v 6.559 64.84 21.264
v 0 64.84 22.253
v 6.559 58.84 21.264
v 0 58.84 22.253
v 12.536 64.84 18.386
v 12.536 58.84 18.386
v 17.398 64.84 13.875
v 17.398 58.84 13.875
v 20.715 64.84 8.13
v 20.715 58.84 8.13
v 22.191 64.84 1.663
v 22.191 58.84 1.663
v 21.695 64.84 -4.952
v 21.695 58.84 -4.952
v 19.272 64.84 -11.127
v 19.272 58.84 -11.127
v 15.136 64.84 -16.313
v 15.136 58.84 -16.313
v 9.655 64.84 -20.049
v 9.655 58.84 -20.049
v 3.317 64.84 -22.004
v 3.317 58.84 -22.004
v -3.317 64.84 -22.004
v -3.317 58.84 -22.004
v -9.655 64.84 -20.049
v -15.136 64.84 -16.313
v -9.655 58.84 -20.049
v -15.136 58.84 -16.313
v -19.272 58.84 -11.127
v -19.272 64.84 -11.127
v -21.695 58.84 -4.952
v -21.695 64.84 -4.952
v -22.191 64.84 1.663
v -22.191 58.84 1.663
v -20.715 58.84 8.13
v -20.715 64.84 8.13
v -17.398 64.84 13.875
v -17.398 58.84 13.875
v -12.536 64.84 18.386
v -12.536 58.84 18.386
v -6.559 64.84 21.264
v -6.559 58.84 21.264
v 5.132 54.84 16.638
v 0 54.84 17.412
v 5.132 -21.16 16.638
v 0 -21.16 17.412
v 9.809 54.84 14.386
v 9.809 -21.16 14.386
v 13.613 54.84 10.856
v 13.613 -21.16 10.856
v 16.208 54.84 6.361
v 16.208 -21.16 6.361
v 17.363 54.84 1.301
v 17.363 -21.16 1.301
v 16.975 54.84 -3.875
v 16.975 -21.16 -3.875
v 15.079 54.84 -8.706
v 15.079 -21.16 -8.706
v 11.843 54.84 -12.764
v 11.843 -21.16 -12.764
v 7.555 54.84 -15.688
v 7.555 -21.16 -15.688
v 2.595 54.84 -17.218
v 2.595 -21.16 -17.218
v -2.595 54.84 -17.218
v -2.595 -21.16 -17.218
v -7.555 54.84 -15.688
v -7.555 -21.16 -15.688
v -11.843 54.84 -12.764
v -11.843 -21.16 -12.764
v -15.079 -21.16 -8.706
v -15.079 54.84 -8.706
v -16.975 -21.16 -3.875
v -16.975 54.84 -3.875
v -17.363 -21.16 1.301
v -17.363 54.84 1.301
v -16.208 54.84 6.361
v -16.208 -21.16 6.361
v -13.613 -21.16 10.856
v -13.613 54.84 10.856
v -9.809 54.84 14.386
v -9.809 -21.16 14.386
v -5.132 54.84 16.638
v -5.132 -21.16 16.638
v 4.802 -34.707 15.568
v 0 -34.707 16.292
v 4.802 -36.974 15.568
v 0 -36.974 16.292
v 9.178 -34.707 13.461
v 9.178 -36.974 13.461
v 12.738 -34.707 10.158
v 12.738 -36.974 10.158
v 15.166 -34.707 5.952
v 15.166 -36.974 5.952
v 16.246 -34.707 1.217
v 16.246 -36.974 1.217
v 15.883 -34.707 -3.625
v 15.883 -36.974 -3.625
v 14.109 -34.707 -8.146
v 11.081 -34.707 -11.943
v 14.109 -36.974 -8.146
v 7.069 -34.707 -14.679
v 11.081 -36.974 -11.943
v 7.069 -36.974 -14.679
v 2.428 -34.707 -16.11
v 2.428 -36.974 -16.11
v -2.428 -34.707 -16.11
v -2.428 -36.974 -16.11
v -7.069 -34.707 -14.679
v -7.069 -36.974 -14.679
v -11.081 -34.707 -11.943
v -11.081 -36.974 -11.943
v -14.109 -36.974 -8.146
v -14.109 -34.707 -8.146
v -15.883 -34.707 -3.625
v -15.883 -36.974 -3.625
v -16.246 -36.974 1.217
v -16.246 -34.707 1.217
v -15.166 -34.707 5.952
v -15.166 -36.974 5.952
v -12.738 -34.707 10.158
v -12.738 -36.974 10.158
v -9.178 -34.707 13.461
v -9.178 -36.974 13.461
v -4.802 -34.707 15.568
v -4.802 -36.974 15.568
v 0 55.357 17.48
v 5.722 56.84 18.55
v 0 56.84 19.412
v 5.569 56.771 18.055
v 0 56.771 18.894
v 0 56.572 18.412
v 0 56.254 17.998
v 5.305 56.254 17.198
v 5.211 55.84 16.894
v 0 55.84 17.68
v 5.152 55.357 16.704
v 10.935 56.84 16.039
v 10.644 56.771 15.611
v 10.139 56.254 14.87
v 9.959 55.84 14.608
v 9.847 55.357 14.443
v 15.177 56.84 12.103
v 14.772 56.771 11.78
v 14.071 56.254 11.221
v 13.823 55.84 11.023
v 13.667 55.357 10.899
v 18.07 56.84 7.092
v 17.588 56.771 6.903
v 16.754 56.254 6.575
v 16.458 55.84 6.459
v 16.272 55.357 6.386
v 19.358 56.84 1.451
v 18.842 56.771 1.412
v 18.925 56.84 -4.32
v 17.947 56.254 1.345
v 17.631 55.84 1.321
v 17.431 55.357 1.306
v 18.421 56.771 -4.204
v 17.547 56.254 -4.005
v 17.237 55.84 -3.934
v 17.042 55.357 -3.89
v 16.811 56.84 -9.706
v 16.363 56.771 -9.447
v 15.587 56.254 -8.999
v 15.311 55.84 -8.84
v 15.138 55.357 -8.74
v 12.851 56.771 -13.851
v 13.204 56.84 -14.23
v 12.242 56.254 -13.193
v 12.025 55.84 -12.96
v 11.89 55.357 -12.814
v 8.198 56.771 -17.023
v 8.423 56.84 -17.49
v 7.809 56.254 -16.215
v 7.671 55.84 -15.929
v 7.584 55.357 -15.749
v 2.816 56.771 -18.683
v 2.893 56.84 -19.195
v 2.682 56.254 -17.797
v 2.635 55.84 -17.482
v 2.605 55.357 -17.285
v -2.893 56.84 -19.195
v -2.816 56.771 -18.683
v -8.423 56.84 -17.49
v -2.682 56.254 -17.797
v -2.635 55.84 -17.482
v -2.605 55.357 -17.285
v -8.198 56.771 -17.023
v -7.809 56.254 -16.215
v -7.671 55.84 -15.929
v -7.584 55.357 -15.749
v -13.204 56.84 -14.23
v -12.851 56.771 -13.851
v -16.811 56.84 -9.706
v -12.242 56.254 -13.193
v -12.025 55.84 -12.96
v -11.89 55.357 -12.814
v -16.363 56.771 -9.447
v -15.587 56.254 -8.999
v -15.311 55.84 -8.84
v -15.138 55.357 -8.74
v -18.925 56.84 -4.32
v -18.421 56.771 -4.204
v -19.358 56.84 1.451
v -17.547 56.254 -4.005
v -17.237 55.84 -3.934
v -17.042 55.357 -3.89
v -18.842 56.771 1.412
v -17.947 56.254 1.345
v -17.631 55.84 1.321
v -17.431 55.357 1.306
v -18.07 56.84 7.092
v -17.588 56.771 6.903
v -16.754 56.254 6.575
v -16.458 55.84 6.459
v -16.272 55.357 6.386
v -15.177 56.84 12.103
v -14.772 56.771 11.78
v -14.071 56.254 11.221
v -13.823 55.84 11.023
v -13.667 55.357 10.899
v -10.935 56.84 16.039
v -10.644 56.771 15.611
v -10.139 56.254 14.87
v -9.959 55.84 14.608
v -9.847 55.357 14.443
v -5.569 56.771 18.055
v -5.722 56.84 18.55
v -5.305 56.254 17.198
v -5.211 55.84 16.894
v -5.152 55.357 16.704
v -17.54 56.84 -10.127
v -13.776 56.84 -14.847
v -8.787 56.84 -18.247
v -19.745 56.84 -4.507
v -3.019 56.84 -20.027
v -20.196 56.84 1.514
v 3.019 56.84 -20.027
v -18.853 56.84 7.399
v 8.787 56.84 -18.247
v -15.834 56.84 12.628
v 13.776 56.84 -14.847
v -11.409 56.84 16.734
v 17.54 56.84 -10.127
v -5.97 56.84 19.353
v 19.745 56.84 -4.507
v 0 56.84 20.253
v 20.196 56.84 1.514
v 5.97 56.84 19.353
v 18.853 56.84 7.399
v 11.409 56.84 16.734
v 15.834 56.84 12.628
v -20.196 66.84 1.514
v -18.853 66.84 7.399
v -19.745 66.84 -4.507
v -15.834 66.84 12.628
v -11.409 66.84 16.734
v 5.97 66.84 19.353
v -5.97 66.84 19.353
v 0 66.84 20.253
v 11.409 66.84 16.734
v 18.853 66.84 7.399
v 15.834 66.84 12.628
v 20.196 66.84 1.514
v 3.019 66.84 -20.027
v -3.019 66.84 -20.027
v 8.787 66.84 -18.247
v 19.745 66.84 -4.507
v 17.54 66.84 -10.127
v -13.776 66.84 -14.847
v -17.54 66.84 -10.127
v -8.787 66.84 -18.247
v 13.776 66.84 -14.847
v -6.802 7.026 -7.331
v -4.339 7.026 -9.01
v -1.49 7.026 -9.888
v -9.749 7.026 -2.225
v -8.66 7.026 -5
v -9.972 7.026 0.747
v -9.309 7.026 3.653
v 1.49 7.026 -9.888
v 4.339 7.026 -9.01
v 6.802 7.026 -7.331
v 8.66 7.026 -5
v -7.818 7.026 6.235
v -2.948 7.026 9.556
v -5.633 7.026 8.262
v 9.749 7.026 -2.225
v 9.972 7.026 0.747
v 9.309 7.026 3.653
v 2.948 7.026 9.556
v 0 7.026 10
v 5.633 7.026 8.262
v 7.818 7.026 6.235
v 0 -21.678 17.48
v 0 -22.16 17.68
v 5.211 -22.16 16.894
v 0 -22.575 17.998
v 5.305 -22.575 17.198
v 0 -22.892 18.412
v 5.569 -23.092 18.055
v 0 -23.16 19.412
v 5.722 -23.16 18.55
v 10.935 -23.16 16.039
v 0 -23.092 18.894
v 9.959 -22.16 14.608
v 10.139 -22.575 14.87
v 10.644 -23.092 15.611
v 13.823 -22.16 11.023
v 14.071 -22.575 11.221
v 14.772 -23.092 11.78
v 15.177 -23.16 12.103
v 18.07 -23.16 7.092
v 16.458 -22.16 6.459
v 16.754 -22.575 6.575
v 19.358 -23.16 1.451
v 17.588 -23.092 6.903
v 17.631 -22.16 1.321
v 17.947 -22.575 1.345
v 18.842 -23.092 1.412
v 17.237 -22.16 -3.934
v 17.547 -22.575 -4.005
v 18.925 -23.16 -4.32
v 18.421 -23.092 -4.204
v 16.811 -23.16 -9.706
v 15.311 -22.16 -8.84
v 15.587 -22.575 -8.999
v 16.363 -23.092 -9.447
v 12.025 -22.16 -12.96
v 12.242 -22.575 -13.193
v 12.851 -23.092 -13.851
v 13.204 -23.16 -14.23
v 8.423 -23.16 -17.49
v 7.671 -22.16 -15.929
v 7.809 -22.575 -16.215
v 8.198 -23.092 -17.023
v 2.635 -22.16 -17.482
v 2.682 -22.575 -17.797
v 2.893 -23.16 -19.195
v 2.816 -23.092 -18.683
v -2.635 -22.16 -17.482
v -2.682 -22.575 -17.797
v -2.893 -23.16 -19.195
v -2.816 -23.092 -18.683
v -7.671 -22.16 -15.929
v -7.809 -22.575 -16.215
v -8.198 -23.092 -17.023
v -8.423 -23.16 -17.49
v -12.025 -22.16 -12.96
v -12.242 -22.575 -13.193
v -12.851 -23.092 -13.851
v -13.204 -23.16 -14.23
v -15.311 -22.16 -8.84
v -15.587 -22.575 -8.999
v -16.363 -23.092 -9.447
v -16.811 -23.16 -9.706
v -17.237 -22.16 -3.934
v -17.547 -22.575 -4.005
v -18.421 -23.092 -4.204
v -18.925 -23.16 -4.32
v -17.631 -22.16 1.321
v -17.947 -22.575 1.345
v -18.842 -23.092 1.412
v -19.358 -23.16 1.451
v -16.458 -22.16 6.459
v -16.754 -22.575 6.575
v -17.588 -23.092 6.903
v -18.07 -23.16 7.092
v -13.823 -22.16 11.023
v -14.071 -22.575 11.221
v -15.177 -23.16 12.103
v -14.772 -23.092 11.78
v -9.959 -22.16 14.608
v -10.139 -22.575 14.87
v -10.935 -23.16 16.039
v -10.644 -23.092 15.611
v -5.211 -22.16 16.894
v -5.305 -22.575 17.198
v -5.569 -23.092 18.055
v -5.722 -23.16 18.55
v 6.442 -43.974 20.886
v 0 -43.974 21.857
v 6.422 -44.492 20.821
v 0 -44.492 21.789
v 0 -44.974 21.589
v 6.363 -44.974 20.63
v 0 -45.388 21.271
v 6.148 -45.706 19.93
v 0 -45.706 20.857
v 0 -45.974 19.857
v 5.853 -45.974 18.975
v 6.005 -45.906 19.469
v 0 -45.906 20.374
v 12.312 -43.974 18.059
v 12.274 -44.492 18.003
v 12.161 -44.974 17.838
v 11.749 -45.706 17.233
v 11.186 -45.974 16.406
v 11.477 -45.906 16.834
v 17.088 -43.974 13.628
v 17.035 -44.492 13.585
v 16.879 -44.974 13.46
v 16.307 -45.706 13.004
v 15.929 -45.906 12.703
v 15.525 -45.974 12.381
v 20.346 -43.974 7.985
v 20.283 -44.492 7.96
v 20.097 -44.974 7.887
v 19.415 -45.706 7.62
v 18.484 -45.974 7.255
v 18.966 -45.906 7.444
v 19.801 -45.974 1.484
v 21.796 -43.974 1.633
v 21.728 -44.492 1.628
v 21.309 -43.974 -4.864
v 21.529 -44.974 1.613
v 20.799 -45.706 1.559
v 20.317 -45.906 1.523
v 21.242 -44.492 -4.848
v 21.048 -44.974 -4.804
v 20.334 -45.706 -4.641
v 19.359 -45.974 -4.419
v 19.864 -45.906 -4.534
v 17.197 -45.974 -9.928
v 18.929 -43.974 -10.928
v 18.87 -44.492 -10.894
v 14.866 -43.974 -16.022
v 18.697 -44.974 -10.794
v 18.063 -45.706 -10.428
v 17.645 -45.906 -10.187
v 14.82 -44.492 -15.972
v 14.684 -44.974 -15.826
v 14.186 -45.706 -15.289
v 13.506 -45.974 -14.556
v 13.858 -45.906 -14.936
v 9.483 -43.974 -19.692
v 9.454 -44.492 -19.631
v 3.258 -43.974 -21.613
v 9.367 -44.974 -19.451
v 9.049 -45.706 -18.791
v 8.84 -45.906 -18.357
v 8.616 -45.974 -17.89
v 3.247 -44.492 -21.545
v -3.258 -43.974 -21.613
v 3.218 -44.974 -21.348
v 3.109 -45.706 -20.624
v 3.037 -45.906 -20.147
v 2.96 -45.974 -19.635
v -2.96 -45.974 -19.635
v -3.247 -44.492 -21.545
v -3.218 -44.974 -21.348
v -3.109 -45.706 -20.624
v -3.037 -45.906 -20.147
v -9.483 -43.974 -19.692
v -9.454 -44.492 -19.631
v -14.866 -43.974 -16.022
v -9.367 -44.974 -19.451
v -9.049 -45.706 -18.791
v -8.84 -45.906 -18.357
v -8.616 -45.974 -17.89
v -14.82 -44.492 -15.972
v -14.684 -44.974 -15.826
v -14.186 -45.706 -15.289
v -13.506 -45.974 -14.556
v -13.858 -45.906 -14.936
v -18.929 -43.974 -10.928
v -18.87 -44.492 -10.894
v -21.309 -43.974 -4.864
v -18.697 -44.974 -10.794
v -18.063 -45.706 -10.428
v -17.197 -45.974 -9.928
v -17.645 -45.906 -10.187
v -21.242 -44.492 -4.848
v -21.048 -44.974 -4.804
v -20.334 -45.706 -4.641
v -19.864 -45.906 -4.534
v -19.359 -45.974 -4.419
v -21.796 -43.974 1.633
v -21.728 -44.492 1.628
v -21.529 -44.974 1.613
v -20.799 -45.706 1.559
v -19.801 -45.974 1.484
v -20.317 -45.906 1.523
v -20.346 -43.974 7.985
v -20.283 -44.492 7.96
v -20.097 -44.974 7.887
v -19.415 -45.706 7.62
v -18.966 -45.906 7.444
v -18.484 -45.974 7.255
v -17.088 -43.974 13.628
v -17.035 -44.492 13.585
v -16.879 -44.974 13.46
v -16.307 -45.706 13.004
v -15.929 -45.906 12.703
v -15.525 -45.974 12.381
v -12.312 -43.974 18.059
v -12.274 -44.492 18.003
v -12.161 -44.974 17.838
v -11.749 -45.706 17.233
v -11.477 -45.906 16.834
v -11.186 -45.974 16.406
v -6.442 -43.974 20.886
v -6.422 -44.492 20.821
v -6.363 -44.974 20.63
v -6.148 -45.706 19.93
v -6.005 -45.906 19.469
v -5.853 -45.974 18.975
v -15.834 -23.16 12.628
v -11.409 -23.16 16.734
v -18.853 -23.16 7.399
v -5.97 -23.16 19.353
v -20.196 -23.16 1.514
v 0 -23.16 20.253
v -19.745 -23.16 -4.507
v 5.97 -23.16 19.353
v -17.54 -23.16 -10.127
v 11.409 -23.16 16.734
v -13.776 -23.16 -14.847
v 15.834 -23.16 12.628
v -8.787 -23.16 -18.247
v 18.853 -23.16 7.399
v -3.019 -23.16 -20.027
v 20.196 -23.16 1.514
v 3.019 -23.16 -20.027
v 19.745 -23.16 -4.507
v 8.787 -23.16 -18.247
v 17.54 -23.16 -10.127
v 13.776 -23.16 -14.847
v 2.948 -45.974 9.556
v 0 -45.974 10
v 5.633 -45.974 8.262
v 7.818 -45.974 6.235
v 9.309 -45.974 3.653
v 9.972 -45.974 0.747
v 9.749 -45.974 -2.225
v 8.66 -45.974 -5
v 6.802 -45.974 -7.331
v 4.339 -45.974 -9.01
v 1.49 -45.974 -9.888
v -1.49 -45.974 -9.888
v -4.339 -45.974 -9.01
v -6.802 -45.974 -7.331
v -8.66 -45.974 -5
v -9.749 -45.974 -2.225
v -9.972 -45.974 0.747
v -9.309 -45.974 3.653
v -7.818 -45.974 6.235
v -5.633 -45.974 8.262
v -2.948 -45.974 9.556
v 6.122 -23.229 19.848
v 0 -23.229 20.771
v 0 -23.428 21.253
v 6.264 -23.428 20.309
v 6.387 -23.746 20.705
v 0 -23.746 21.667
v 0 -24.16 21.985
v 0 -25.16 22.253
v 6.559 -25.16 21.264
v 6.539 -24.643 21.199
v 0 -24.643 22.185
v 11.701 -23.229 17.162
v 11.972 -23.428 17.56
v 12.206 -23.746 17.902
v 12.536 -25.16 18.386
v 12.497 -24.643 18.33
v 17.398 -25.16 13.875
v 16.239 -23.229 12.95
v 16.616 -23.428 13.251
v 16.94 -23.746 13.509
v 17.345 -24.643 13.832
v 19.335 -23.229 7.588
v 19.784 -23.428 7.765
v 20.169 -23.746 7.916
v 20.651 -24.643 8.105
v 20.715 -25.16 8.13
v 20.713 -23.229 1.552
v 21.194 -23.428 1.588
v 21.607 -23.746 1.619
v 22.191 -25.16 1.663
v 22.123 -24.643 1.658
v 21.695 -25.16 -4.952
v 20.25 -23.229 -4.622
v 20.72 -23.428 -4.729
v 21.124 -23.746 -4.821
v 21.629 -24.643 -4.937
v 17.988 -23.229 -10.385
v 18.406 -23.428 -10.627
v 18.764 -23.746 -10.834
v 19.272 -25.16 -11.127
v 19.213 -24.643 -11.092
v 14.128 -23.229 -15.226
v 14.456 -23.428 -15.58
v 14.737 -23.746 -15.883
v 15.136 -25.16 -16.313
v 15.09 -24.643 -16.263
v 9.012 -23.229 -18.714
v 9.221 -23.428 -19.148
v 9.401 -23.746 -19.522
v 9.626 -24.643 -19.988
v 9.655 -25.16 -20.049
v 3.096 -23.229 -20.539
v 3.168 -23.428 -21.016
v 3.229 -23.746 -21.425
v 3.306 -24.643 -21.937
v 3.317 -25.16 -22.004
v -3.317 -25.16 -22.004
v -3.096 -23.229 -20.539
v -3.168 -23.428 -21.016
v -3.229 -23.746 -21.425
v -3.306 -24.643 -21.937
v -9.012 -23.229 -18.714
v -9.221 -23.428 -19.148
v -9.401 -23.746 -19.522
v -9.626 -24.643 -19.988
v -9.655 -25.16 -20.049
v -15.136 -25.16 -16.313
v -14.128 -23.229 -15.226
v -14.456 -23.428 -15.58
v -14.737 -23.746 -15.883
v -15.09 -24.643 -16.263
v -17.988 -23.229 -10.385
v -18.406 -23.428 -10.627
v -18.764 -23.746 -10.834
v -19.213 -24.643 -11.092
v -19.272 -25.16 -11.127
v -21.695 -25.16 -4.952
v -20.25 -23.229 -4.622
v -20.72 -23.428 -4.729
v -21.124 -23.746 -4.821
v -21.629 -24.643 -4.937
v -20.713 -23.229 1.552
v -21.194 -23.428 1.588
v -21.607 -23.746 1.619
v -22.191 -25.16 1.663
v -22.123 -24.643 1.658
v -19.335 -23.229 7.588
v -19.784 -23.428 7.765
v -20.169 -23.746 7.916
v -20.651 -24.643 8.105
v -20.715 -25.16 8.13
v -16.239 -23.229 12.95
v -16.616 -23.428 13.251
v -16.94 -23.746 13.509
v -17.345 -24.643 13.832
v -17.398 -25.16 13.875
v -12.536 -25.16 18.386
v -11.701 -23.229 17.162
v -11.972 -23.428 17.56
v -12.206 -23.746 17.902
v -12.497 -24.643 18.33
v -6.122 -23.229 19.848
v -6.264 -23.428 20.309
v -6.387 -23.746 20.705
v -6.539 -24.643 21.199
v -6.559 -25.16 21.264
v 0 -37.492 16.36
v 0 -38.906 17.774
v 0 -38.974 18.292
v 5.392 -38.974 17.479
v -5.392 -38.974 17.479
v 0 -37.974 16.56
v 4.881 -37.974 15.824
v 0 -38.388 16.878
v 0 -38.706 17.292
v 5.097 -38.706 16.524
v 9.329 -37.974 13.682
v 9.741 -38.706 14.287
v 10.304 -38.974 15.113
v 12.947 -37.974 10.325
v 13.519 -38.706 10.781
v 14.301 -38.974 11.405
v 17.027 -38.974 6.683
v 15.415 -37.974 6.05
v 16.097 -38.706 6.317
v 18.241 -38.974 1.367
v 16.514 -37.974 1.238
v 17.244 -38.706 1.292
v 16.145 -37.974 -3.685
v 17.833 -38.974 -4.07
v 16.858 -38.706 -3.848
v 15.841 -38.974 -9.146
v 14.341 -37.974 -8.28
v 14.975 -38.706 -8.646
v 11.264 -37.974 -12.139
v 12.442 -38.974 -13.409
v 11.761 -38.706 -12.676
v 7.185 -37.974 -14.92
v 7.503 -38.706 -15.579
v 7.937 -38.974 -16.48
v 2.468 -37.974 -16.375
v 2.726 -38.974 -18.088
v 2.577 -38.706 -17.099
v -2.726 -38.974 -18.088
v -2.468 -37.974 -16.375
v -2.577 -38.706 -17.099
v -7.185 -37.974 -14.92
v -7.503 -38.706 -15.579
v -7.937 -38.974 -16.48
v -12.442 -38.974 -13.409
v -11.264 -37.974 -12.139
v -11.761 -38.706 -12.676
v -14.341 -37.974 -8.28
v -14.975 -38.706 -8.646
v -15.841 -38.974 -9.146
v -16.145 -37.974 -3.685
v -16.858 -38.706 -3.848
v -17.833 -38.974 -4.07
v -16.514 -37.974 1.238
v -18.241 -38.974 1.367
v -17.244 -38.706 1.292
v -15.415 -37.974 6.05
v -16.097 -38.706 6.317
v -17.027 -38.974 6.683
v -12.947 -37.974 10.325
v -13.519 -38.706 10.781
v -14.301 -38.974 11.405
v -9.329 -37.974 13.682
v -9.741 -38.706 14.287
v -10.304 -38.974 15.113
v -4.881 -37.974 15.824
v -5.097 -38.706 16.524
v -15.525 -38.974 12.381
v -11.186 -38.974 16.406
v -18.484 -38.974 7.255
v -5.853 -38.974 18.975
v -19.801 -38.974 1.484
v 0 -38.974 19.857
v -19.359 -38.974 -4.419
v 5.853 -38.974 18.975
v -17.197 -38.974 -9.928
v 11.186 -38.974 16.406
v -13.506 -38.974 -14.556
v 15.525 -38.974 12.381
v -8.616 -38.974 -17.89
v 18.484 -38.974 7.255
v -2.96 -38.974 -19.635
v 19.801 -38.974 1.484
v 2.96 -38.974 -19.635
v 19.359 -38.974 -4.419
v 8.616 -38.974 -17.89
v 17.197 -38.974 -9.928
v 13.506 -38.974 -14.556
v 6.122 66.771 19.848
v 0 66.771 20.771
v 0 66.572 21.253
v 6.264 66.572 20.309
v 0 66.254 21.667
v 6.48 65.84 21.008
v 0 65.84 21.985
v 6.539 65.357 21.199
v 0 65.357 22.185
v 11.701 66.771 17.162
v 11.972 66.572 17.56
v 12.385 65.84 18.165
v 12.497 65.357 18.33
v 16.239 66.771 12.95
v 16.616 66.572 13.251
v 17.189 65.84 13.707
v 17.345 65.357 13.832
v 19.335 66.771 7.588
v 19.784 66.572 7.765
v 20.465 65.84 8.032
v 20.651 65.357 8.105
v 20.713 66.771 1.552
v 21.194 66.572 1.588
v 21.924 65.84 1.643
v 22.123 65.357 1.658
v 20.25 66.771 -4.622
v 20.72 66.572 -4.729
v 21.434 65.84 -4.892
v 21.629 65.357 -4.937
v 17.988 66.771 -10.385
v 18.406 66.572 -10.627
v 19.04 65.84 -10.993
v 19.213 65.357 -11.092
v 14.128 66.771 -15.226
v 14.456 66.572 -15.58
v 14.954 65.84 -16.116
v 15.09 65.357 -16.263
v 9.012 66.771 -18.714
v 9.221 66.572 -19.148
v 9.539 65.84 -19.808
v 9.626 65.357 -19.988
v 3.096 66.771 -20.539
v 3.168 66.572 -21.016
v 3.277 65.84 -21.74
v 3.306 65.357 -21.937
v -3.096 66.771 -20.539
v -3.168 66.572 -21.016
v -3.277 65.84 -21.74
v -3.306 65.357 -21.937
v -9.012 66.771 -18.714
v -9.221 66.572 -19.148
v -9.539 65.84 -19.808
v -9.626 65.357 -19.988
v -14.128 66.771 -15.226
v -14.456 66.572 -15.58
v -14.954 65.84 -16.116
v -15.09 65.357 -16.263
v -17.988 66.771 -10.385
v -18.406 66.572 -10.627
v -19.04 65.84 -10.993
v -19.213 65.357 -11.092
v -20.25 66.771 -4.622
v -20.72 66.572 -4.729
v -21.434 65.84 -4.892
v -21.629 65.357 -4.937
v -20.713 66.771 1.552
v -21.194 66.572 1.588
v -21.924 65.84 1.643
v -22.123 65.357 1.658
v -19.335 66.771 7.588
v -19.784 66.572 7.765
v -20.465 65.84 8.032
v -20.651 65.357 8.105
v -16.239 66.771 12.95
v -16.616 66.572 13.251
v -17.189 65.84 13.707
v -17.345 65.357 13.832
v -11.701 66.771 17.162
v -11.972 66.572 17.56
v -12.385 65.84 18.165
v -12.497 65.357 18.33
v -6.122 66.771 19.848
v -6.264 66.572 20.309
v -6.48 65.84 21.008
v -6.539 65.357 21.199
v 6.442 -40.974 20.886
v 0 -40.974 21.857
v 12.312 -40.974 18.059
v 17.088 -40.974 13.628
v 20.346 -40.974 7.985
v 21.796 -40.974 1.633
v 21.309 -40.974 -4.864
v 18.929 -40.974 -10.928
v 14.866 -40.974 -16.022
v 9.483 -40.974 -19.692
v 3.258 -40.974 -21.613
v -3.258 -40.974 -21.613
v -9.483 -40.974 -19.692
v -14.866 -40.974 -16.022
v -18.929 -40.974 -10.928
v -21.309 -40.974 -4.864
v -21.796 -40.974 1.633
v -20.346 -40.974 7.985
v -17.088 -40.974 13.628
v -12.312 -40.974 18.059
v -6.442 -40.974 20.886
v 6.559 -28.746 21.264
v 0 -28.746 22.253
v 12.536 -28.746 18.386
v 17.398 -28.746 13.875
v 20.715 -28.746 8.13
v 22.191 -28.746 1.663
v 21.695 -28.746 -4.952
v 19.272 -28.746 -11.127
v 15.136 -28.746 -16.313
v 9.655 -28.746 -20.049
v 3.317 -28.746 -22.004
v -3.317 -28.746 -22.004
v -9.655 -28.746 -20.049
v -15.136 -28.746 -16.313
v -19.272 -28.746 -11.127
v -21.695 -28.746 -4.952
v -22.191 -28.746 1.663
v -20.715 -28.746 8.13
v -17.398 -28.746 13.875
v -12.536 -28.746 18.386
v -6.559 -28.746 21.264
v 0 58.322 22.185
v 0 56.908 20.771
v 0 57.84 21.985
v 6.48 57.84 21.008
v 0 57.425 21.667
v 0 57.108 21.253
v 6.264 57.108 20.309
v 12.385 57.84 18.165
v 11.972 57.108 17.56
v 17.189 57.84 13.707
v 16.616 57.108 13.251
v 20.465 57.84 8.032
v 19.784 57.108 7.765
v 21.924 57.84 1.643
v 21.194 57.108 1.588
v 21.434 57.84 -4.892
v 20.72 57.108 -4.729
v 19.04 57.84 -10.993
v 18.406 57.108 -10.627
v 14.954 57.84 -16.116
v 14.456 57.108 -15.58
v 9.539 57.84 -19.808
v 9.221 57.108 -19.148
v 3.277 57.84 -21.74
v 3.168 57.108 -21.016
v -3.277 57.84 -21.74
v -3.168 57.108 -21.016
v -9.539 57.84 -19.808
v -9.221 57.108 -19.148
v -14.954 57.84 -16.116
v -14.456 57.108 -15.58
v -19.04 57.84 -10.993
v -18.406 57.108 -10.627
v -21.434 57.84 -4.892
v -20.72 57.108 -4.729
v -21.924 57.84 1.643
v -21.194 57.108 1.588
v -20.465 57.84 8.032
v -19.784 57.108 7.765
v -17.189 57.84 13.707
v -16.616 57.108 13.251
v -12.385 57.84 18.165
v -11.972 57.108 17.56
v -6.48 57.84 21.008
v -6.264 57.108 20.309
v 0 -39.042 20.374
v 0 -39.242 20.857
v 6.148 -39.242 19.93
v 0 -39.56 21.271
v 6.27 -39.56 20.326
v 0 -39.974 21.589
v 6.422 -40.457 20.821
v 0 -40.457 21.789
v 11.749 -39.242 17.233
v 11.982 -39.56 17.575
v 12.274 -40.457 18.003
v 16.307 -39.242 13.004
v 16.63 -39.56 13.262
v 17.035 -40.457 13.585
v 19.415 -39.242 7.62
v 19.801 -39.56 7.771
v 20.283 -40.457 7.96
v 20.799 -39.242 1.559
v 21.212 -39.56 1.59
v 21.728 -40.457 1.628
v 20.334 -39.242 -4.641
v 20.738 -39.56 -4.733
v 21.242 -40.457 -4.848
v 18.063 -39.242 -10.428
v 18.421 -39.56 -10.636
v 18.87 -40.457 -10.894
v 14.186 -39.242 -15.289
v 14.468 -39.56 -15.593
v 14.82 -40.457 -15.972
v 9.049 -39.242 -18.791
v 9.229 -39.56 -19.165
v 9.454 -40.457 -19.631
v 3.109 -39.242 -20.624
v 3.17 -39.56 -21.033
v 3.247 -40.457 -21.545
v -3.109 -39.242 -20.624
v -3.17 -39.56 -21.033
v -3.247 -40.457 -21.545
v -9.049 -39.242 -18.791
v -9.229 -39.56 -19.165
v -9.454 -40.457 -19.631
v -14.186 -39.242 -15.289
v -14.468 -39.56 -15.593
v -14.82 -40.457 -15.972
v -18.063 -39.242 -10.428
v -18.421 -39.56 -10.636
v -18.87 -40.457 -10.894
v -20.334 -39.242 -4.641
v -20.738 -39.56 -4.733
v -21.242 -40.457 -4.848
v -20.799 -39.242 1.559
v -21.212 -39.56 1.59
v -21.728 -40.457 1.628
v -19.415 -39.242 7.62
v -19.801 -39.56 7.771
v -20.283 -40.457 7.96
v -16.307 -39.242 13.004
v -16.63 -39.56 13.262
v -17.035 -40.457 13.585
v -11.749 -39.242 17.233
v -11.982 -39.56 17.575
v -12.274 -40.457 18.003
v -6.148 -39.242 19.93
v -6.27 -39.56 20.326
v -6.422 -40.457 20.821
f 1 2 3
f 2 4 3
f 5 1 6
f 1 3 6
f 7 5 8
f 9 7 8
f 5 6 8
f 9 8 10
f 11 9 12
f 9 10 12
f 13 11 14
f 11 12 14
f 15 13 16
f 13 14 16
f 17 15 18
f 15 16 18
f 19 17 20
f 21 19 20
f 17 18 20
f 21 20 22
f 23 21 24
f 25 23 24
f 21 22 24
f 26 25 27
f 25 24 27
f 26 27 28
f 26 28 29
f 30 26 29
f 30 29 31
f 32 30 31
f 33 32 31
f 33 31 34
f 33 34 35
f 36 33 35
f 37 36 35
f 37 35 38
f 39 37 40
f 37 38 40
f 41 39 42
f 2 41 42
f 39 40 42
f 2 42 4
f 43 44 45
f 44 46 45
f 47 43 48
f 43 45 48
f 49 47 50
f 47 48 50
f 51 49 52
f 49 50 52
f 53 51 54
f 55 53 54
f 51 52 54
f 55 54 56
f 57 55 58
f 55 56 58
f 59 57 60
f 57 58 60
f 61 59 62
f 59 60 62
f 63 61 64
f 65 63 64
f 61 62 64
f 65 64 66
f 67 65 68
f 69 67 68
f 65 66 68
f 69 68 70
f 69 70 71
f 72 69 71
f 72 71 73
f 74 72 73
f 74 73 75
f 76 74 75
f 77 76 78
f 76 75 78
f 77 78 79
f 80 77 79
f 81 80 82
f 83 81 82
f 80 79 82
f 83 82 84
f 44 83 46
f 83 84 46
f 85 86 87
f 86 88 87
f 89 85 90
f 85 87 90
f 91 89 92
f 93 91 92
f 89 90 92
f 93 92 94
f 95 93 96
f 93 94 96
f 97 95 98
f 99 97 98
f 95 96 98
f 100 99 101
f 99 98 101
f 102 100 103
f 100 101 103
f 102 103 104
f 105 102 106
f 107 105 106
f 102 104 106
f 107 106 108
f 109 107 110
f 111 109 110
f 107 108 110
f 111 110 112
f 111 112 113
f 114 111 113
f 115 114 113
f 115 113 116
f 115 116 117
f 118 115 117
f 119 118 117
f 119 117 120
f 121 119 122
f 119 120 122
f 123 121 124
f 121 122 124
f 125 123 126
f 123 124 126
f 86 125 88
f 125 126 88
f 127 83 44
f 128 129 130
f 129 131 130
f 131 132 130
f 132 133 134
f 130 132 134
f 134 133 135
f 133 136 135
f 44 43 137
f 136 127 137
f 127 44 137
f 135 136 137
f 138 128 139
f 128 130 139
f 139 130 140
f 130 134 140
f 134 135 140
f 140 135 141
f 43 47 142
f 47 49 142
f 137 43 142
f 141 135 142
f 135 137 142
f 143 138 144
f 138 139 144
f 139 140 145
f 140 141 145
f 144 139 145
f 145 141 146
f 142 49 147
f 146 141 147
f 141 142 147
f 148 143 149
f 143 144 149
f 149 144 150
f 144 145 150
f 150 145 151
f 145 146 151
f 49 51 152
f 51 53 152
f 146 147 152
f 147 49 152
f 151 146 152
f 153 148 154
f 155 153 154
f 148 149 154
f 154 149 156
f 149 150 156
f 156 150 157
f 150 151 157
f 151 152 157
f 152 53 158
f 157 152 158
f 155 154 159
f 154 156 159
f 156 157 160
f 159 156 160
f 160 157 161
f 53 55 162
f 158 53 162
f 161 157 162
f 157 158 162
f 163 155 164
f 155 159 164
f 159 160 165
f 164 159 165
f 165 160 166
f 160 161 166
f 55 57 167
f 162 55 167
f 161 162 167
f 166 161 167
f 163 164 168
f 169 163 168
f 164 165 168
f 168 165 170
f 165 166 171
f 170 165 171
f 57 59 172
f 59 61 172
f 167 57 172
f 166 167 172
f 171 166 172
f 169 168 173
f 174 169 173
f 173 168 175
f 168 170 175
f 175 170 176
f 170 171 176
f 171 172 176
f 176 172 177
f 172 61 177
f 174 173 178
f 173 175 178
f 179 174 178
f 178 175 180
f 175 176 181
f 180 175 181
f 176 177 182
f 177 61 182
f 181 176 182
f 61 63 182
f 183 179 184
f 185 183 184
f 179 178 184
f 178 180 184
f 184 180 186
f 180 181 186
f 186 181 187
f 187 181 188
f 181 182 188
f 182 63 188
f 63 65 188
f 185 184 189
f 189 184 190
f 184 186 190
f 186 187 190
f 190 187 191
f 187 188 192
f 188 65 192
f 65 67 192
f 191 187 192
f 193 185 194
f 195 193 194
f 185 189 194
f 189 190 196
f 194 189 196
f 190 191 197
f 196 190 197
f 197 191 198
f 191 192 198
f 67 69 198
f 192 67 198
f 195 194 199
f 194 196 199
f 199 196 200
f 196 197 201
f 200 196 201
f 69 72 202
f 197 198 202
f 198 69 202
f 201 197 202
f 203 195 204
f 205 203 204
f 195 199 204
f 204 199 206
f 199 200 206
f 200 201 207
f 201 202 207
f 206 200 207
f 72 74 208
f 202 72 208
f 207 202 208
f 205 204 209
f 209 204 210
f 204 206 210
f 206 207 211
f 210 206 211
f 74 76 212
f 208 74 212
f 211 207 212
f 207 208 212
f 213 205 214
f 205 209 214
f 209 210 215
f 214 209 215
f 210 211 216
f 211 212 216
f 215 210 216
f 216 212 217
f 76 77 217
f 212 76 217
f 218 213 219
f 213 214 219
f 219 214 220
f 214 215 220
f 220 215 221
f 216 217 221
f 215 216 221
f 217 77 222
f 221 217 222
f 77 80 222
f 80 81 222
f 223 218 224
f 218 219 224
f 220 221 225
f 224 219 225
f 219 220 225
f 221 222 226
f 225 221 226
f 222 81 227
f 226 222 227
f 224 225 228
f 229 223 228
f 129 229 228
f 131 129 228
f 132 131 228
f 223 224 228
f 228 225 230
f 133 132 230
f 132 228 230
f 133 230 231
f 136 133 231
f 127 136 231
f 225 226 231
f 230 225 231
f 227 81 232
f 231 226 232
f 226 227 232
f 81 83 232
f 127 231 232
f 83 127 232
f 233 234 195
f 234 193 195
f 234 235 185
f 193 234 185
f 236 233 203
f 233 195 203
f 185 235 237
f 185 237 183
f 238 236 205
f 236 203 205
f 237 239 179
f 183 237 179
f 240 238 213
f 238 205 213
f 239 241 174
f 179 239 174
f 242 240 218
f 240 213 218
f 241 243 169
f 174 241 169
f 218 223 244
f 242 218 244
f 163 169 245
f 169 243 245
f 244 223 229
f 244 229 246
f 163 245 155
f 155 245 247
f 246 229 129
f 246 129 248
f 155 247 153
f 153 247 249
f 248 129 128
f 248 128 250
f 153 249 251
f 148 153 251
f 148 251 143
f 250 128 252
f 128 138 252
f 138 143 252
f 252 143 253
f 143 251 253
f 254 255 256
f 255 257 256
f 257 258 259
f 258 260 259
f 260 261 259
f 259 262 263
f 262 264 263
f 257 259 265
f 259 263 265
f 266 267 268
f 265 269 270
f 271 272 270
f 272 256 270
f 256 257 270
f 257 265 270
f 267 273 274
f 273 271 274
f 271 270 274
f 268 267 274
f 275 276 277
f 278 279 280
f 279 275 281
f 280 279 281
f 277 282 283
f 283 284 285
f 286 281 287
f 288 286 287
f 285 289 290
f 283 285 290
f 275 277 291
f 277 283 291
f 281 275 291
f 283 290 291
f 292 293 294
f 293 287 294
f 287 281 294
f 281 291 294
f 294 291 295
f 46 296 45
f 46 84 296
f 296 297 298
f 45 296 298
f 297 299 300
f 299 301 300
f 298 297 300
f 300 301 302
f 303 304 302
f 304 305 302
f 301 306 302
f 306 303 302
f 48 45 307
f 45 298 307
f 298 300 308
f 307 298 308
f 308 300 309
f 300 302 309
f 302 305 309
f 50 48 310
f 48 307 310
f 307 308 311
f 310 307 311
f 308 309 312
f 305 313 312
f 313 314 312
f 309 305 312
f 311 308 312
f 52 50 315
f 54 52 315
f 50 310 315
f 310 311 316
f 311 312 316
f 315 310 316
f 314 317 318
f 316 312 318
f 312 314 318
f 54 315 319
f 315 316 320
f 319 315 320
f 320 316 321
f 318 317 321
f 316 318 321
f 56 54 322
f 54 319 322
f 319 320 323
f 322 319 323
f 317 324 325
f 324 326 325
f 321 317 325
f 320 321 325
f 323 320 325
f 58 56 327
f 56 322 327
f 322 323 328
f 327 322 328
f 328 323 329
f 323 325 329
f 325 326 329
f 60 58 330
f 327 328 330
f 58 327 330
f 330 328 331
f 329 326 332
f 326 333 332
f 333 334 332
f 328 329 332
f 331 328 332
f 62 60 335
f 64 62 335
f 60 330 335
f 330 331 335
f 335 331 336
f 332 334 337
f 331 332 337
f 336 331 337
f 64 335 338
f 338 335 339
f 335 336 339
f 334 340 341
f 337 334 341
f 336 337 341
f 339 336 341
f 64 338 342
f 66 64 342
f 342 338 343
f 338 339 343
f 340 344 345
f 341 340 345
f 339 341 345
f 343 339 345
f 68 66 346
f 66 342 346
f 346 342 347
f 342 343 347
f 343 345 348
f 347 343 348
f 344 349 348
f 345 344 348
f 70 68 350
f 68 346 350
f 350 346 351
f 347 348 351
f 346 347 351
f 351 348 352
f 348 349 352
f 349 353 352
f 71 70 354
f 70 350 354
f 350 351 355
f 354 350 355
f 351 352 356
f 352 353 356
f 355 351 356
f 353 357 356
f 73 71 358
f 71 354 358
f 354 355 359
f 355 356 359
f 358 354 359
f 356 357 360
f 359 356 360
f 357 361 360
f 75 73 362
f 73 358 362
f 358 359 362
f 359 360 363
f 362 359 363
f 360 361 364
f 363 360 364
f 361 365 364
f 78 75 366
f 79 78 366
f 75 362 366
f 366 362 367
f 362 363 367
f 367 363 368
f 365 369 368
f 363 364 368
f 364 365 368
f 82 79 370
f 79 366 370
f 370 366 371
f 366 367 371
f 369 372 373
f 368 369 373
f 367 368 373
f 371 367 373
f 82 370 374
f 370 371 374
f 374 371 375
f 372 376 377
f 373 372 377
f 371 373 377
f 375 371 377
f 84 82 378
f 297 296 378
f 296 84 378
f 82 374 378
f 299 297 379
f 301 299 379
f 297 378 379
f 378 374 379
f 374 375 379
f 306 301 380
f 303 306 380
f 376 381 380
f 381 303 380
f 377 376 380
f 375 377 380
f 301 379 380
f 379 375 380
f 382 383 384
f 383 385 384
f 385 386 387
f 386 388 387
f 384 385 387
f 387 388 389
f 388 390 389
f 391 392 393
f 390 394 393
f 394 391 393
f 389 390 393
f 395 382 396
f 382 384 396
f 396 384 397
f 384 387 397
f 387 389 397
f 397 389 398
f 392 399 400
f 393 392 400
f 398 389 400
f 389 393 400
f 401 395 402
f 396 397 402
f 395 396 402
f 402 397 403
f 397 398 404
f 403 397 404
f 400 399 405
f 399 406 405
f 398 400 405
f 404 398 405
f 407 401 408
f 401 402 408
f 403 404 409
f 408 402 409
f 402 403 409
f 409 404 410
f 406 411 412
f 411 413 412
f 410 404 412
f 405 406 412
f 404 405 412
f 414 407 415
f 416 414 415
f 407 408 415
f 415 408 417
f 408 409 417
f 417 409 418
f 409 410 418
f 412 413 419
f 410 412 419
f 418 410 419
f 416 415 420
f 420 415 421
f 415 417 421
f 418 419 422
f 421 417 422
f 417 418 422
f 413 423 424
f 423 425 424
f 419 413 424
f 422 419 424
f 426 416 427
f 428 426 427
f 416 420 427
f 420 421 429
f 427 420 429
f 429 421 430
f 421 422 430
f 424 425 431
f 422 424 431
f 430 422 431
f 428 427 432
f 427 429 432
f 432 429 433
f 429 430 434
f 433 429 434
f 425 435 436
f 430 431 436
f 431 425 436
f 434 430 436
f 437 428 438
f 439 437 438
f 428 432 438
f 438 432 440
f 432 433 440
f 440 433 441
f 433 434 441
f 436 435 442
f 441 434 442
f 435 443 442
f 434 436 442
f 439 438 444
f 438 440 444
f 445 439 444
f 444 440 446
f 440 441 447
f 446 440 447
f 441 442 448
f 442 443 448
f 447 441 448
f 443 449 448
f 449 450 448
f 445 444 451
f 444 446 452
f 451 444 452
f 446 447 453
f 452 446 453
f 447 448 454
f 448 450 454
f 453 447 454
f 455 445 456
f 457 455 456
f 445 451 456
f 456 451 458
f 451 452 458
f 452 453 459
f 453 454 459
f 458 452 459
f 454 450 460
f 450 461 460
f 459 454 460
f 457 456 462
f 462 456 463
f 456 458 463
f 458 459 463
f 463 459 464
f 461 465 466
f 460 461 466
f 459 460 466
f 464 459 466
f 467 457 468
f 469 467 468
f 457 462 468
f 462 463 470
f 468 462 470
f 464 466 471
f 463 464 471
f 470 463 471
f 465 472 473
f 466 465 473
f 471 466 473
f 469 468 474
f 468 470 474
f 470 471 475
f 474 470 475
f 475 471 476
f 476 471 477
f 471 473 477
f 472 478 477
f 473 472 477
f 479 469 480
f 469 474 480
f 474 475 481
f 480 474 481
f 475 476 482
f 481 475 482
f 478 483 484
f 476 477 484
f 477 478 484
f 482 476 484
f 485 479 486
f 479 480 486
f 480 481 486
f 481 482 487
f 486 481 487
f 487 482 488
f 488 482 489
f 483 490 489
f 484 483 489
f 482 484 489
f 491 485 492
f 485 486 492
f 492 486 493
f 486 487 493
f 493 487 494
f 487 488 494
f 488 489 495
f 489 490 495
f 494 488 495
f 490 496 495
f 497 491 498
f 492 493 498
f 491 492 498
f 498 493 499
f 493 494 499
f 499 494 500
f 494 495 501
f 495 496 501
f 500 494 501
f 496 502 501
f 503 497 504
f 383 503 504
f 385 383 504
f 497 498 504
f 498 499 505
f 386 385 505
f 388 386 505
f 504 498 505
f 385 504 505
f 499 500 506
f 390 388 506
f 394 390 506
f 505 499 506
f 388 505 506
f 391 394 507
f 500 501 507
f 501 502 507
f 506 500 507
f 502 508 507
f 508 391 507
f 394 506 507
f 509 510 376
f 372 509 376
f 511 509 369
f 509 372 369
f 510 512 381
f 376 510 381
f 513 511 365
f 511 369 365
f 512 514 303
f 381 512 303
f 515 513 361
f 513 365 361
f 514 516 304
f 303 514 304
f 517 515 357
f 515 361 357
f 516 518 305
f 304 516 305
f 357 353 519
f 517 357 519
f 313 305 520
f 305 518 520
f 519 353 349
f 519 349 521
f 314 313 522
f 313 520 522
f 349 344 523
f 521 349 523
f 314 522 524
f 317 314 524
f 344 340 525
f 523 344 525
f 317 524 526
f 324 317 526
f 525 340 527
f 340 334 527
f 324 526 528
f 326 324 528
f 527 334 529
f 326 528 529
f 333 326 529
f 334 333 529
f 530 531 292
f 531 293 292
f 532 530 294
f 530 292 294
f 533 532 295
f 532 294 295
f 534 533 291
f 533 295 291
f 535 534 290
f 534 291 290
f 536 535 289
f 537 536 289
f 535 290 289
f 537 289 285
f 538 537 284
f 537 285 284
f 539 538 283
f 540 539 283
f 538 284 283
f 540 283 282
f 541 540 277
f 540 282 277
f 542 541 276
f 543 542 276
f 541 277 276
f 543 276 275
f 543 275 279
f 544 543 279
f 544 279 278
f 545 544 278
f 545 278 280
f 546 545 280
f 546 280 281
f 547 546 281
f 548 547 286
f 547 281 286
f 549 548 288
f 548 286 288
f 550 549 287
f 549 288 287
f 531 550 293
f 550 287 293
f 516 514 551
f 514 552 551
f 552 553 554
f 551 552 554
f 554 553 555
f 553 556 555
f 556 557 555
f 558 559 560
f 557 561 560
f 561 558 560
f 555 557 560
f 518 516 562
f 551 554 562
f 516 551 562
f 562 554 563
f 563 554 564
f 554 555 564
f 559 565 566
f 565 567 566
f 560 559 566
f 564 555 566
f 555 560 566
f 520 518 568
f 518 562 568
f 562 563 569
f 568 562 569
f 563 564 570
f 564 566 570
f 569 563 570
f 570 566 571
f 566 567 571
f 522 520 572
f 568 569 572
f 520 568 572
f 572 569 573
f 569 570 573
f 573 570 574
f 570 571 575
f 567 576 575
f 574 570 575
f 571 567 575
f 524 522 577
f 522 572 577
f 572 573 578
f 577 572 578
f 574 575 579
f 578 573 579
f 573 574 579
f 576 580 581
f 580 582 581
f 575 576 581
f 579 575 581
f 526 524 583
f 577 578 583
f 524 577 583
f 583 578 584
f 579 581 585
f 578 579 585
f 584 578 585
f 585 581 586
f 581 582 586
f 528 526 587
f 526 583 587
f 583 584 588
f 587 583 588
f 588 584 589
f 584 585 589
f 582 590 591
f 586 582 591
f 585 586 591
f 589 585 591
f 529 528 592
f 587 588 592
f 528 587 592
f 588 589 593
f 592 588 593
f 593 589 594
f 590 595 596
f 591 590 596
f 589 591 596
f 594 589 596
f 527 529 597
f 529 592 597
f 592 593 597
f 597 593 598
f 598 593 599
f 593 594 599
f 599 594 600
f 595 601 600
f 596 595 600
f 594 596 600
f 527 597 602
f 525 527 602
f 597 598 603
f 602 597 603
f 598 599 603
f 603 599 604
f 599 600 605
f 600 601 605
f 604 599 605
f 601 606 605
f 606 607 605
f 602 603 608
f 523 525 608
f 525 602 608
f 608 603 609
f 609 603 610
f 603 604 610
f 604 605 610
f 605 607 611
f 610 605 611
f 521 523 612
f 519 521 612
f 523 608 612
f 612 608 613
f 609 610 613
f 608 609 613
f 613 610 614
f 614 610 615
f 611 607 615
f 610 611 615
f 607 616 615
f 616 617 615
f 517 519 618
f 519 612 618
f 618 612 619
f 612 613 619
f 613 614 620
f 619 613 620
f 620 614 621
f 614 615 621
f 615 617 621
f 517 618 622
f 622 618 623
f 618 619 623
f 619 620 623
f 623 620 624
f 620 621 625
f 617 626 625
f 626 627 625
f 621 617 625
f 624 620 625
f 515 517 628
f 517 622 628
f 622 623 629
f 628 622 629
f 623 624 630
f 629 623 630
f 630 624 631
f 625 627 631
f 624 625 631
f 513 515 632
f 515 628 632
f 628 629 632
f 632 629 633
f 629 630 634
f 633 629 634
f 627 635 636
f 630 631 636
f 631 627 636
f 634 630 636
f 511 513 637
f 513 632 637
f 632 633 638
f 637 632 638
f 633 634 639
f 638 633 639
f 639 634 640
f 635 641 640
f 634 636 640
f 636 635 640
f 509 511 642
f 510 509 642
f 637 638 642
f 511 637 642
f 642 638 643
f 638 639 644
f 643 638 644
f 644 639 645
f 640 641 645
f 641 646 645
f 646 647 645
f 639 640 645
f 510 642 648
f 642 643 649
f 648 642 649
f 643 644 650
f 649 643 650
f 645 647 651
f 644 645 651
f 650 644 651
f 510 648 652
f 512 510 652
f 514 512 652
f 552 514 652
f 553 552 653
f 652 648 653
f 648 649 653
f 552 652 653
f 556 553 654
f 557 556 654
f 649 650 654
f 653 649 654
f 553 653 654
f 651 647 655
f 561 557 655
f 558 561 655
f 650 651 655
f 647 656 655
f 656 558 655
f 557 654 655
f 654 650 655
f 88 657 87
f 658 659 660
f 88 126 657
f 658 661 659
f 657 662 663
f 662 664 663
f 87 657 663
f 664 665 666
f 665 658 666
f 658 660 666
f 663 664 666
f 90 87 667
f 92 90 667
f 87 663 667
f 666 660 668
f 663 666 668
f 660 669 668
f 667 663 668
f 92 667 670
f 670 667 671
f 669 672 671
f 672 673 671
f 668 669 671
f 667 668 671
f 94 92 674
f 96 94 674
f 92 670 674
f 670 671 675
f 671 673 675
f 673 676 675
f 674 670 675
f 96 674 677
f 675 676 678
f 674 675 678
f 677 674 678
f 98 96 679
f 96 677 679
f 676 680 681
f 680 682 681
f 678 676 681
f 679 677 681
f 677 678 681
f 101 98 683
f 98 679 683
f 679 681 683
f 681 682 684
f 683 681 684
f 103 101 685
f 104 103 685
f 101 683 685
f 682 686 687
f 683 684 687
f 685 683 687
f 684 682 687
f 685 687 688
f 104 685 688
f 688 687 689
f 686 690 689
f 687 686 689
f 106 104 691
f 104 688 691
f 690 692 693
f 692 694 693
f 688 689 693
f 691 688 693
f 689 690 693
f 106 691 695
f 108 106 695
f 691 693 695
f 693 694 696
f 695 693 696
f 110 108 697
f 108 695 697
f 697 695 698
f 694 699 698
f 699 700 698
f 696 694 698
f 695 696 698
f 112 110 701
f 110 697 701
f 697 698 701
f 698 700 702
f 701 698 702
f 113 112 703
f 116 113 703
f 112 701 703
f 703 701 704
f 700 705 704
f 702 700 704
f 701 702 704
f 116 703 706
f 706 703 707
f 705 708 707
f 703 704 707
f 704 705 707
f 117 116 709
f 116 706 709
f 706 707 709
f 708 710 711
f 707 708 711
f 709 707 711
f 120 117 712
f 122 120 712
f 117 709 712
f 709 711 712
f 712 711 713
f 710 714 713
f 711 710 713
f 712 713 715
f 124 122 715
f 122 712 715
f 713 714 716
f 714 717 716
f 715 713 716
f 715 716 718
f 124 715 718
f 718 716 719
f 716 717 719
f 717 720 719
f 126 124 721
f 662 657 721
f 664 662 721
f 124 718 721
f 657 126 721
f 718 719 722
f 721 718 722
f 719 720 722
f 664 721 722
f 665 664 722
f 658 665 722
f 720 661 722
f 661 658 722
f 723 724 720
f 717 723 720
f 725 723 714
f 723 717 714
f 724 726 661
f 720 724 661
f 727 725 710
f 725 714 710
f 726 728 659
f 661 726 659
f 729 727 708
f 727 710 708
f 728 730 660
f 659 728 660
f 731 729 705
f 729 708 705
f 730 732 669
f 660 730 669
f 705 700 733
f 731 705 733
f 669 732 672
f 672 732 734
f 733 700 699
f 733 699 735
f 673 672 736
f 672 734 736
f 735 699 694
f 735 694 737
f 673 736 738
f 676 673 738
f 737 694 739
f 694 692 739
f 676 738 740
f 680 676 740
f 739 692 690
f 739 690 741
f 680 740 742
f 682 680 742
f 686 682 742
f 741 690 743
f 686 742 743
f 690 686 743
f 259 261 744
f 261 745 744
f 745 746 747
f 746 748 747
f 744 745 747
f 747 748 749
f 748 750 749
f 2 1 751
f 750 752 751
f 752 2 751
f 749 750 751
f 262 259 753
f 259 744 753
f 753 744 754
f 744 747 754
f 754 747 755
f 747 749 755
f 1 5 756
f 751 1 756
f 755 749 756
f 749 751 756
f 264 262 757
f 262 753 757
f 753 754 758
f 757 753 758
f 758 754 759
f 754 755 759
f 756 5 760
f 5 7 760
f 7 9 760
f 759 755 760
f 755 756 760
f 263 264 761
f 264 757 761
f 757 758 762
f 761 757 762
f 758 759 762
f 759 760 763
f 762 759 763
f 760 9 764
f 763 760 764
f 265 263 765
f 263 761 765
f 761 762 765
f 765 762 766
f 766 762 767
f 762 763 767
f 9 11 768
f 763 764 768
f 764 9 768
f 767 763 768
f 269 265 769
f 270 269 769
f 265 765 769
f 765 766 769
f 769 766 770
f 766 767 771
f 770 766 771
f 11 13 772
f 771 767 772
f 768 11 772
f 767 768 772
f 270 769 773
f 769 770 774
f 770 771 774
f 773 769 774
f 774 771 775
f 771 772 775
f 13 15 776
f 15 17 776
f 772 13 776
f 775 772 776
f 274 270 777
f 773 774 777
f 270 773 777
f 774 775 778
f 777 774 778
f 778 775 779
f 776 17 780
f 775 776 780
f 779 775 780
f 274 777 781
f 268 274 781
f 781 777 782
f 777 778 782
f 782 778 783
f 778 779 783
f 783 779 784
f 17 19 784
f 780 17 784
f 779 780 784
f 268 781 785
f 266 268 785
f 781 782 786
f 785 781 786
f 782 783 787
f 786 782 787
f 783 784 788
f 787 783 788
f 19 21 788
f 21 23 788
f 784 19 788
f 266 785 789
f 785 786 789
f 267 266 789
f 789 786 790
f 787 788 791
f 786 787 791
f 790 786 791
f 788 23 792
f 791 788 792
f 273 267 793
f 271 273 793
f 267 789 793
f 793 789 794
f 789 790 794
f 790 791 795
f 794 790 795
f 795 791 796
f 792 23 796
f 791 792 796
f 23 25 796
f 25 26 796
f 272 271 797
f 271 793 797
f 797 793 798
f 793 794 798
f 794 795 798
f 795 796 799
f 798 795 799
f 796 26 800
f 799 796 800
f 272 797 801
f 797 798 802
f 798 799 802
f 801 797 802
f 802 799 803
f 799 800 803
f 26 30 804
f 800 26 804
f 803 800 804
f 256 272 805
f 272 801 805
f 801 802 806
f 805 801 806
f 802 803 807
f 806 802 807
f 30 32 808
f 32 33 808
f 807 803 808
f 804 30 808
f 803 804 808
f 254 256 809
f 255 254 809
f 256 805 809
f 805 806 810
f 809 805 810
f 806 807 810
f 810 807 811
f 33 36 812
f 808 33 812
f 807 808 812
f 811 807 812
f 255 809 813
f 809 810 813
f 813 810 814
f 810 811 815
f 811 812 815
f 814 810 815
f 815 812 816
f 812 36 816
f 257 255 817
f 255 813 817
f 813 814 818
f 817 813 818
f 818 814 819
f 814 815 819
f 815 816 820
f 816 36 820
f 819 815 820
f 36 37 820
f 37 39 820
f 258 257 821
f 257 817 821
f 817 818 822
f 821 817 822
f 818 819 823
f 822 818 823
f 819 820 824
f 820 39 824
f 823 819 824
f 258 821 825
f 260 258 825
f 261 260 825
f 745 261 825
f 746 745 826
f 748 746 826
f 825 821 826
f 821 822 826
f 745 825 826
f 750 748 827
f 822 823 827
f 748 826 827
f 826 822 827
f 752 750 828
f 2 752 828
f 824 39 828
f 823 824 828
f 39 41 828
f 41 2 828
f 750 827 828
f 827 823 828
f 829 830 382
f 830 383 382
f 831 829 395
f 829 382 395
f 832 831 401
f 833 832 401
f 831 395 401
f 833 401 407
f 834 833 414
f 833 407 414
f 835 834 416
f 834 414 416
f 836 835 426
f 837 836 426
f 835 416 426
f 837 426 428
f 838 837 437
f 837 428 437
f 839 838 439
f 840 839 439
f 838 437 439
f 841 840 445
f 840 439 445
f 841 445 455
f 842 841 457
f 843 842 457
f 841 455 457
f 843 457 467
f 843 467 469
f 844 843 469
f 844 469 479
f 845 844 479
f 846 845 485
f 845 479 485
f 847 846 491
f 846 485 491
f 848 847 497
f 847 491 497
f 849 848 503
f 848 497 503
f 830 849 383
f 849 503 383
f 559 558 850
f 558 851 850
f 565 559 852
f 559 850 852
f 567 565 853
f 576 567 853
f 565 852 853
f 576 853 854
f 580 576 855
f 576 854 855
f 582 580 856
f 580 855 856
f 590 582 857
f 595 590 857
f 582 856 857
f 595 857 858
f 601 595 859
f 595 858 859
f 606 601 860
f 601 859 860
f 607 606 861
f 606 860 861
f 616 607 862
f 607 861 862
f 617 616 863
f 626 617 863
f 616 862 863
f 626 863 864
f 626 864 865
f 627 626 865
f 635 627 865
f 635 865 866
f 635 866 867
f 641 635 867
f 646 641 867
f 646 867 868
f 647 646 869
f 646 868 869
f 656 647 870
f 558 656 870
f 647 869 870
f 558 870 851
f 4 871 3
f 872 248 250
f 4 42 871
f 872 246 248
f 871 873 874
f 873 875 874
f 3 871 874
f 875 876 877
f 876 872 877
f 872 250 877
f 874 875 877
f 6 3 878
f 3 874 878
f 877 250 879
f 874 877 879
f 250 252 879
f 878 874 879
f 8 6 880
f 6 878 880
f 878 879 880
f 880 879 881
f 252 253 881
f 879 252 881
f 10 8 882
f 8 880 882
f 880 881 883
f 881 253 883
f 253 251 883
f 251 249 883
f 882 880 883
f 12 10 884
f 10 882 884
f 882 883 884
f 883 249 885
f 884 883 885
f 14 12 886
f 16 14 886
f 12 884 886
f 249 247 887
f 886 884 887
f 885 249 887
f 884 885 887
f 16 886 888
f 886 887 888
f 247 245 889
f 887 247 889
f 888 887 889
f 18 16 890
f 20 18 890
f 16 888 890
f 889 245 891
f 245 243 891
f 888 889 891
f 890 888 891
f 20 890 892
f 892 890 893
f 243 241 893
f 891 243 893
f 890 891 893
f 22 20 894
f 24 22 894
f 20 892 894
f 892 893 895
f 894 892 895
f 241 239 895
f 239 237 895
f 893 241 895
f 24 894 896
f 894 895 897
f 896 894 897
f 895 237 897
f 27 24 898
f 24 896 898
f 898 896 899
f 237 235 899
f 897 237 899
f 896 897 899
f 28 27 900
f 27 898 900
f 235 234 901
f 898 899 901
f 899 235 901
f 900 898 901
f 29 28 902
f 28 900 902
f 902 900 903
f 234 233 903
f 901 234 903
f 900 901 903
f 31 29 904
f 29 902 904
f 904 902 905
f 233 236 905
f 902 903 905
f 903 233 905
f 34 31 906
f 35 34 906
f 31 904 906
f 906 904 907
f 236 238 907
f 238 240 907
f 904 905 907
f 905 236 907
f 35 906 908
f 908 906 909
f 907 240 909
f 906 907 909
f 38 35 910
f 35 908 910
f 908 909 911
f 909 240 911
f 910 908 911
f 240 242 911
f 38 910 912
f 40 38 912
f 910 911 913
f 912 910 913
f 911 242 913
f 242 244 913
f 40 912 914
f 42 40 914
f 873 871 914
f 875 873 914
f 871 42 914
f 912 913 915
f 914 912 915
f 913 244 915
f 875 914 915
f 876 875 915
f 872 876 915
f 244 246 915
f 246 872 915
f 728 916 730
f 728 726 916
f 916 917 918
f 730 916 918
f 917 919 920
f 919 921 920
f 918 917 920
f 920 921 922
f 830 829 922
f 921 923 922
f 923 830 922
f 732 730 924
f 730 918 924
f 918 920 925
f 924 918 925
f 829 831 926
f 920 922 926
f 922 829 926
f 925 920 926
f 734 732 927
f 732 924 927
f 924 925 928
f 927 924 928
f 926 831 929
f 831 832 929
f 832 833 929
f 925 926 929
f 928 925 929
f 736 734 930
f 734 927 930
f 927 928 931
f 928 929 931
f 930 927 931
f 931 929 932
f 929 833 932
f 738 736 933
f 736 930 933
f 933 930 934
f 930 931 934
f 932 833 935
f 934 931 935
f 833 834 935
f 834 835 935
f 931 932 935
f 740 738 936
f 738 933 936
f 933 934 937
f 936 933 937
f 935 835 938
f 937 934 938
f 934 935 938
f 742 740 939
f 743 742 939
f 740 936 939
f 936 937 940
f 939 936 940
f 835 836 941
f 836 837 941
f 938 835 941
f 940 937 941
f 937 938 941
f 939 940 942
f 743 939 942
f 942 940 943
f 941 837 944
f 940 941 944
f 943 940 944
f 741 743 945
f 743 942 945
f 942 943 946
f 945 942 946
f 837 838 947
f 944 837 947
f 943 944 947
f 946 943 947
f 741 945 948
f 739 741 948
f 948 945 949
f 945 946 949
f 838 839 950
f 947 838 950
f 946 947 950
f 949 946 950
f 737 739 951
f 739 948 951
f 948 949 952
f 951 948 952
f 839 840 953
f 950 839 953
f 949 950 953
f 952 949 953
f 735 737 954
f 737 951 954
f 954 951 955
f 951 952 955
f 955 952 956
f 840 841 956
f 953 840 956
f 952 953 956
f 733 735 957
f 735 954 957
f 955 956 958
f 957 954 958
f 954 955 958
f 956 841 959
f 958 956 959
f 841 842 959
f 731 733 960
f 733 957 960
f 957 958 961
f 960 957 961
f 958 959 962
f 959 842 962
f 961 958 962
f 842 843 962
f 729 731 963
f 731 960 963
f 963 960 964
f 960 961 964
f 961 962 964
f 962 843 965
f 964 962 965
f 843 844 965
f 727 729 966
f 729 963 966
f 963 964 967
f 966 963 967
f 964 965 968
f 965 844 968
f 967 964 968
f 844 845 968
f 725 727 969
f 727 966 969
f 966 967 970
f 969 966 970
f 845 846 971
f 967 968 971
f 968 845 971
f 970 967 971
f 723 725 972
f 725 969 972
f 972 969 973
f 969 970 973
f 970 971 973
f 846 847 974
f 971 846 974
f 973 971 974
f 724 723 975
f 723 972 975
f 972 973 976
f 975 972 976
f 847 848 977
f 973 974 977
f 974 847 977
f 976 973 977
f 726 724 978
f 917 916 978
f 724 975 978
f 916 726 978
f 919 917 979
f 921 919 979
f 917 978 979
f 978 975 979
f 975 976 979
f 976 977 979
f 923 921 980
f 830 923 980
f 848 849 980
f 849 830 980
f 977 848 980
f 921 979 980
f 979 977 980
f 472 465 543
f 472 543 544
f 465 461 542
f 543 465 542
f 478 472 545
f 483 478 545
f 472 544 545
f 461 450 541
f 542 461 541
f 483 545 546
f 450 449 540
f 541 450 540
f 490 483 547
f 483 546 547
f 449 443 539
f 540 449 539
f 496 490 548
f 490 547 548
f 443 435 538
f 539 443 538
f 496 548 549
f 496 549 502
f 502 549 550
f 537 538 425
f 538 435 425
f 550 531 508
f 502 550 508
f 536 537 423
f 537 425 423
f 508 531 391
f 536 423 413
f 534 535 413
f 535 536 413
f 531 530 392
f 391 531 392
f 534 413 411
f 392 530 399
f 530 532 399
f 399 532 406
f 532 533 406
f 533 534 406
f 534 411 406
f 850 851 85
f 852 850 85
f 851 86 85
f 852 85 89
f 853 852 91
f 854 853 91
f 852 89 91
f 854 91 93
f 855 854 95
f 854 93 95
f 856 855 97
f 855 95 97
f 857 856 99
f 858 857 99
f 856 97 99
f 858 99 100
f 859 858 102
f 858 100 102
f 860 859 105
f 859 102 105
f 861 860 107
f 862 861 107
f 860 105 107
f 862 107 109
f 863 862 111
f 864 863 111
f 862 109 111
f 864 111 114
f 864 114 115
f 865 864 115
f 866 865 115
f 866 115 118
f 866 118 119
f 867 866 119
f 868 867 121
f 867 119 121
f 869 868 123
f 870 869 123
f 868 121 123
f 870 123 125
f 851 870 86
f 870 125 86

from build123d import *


with BuildPart() as f1:
    # F0 (on Right) → F1 (revolve)
    with BuildSketch(Plane.YZ):
        with BuildLine():
            Line((-45.974173, 19.856825), (-45.974173, 10))
            Line((-45.974173, 10), (7.025827, 10))
            Line((7.025827, 10), (7.025827, 0))
            Line((7.025827, 0), (66.839572, 0))
            Line((66.839572, 0), (66.839572, 20.253024))
            ThreePointArc((66.839572, 20.253024), (66.253786, 21.667238), (64.839572, 22.253024))
            Line((64.839572, 22.253024), (58.839572, 22.253024))
            ThreePointArc((58.839572, 22.253024), (57.425359, 21.667238), (56.839572, 20.253024))
            Line((56.839572, 20.253024), (56.839572, 19.411995))
            ThreePointArc((56.839572, 19.411995), (56.253786, 17.997781), (54.839572, 17.411995))
            Line((54.839572, 17.411995), (-21.160428, 17.411995))
            ThreePointArc((-21.160428, 17.411995), (-22.574641, 17.997781), (-23.160428, 19.411995))
            Line((-23.160428, 19.411995), (-23.160428, 20.253024))
            ThreePointArc((-23.160428, 20.253024), (-23.746214, 21.667238), (-25.160428, 22.253024))
            Line((-25.160428, 22.253024), (-28.746232, 22.253024))
            Line((-28.746232, 22.253024), (-34.70733, 16.291926))
            Line((-34.70733, 16.291926), (-36.974173, 16.291926))
            ThreePointArc((-36.974173, 16.291926), (-38.388387, 16.877712), (-38.974173, 18.291926))
            Line((-38.974173, 18.291926), (-38.974173, 19.856825))
            ThreePointArc((-38.974173, 19.856825), (-39.55996, 21.271038), (-40.974173, 21.856825))
            Line((-40.974173, 21.856825), (-43.974173, 21.856825))
            ThreePointArc((-43.974173, 21.856825), (-45.388387, 21.271038), (-45.974173, 19.856825))
        make_face()
    revolve(axis=Axis((0, 34.685813, 0), (0, 1, 0)))


solid = f1.part
